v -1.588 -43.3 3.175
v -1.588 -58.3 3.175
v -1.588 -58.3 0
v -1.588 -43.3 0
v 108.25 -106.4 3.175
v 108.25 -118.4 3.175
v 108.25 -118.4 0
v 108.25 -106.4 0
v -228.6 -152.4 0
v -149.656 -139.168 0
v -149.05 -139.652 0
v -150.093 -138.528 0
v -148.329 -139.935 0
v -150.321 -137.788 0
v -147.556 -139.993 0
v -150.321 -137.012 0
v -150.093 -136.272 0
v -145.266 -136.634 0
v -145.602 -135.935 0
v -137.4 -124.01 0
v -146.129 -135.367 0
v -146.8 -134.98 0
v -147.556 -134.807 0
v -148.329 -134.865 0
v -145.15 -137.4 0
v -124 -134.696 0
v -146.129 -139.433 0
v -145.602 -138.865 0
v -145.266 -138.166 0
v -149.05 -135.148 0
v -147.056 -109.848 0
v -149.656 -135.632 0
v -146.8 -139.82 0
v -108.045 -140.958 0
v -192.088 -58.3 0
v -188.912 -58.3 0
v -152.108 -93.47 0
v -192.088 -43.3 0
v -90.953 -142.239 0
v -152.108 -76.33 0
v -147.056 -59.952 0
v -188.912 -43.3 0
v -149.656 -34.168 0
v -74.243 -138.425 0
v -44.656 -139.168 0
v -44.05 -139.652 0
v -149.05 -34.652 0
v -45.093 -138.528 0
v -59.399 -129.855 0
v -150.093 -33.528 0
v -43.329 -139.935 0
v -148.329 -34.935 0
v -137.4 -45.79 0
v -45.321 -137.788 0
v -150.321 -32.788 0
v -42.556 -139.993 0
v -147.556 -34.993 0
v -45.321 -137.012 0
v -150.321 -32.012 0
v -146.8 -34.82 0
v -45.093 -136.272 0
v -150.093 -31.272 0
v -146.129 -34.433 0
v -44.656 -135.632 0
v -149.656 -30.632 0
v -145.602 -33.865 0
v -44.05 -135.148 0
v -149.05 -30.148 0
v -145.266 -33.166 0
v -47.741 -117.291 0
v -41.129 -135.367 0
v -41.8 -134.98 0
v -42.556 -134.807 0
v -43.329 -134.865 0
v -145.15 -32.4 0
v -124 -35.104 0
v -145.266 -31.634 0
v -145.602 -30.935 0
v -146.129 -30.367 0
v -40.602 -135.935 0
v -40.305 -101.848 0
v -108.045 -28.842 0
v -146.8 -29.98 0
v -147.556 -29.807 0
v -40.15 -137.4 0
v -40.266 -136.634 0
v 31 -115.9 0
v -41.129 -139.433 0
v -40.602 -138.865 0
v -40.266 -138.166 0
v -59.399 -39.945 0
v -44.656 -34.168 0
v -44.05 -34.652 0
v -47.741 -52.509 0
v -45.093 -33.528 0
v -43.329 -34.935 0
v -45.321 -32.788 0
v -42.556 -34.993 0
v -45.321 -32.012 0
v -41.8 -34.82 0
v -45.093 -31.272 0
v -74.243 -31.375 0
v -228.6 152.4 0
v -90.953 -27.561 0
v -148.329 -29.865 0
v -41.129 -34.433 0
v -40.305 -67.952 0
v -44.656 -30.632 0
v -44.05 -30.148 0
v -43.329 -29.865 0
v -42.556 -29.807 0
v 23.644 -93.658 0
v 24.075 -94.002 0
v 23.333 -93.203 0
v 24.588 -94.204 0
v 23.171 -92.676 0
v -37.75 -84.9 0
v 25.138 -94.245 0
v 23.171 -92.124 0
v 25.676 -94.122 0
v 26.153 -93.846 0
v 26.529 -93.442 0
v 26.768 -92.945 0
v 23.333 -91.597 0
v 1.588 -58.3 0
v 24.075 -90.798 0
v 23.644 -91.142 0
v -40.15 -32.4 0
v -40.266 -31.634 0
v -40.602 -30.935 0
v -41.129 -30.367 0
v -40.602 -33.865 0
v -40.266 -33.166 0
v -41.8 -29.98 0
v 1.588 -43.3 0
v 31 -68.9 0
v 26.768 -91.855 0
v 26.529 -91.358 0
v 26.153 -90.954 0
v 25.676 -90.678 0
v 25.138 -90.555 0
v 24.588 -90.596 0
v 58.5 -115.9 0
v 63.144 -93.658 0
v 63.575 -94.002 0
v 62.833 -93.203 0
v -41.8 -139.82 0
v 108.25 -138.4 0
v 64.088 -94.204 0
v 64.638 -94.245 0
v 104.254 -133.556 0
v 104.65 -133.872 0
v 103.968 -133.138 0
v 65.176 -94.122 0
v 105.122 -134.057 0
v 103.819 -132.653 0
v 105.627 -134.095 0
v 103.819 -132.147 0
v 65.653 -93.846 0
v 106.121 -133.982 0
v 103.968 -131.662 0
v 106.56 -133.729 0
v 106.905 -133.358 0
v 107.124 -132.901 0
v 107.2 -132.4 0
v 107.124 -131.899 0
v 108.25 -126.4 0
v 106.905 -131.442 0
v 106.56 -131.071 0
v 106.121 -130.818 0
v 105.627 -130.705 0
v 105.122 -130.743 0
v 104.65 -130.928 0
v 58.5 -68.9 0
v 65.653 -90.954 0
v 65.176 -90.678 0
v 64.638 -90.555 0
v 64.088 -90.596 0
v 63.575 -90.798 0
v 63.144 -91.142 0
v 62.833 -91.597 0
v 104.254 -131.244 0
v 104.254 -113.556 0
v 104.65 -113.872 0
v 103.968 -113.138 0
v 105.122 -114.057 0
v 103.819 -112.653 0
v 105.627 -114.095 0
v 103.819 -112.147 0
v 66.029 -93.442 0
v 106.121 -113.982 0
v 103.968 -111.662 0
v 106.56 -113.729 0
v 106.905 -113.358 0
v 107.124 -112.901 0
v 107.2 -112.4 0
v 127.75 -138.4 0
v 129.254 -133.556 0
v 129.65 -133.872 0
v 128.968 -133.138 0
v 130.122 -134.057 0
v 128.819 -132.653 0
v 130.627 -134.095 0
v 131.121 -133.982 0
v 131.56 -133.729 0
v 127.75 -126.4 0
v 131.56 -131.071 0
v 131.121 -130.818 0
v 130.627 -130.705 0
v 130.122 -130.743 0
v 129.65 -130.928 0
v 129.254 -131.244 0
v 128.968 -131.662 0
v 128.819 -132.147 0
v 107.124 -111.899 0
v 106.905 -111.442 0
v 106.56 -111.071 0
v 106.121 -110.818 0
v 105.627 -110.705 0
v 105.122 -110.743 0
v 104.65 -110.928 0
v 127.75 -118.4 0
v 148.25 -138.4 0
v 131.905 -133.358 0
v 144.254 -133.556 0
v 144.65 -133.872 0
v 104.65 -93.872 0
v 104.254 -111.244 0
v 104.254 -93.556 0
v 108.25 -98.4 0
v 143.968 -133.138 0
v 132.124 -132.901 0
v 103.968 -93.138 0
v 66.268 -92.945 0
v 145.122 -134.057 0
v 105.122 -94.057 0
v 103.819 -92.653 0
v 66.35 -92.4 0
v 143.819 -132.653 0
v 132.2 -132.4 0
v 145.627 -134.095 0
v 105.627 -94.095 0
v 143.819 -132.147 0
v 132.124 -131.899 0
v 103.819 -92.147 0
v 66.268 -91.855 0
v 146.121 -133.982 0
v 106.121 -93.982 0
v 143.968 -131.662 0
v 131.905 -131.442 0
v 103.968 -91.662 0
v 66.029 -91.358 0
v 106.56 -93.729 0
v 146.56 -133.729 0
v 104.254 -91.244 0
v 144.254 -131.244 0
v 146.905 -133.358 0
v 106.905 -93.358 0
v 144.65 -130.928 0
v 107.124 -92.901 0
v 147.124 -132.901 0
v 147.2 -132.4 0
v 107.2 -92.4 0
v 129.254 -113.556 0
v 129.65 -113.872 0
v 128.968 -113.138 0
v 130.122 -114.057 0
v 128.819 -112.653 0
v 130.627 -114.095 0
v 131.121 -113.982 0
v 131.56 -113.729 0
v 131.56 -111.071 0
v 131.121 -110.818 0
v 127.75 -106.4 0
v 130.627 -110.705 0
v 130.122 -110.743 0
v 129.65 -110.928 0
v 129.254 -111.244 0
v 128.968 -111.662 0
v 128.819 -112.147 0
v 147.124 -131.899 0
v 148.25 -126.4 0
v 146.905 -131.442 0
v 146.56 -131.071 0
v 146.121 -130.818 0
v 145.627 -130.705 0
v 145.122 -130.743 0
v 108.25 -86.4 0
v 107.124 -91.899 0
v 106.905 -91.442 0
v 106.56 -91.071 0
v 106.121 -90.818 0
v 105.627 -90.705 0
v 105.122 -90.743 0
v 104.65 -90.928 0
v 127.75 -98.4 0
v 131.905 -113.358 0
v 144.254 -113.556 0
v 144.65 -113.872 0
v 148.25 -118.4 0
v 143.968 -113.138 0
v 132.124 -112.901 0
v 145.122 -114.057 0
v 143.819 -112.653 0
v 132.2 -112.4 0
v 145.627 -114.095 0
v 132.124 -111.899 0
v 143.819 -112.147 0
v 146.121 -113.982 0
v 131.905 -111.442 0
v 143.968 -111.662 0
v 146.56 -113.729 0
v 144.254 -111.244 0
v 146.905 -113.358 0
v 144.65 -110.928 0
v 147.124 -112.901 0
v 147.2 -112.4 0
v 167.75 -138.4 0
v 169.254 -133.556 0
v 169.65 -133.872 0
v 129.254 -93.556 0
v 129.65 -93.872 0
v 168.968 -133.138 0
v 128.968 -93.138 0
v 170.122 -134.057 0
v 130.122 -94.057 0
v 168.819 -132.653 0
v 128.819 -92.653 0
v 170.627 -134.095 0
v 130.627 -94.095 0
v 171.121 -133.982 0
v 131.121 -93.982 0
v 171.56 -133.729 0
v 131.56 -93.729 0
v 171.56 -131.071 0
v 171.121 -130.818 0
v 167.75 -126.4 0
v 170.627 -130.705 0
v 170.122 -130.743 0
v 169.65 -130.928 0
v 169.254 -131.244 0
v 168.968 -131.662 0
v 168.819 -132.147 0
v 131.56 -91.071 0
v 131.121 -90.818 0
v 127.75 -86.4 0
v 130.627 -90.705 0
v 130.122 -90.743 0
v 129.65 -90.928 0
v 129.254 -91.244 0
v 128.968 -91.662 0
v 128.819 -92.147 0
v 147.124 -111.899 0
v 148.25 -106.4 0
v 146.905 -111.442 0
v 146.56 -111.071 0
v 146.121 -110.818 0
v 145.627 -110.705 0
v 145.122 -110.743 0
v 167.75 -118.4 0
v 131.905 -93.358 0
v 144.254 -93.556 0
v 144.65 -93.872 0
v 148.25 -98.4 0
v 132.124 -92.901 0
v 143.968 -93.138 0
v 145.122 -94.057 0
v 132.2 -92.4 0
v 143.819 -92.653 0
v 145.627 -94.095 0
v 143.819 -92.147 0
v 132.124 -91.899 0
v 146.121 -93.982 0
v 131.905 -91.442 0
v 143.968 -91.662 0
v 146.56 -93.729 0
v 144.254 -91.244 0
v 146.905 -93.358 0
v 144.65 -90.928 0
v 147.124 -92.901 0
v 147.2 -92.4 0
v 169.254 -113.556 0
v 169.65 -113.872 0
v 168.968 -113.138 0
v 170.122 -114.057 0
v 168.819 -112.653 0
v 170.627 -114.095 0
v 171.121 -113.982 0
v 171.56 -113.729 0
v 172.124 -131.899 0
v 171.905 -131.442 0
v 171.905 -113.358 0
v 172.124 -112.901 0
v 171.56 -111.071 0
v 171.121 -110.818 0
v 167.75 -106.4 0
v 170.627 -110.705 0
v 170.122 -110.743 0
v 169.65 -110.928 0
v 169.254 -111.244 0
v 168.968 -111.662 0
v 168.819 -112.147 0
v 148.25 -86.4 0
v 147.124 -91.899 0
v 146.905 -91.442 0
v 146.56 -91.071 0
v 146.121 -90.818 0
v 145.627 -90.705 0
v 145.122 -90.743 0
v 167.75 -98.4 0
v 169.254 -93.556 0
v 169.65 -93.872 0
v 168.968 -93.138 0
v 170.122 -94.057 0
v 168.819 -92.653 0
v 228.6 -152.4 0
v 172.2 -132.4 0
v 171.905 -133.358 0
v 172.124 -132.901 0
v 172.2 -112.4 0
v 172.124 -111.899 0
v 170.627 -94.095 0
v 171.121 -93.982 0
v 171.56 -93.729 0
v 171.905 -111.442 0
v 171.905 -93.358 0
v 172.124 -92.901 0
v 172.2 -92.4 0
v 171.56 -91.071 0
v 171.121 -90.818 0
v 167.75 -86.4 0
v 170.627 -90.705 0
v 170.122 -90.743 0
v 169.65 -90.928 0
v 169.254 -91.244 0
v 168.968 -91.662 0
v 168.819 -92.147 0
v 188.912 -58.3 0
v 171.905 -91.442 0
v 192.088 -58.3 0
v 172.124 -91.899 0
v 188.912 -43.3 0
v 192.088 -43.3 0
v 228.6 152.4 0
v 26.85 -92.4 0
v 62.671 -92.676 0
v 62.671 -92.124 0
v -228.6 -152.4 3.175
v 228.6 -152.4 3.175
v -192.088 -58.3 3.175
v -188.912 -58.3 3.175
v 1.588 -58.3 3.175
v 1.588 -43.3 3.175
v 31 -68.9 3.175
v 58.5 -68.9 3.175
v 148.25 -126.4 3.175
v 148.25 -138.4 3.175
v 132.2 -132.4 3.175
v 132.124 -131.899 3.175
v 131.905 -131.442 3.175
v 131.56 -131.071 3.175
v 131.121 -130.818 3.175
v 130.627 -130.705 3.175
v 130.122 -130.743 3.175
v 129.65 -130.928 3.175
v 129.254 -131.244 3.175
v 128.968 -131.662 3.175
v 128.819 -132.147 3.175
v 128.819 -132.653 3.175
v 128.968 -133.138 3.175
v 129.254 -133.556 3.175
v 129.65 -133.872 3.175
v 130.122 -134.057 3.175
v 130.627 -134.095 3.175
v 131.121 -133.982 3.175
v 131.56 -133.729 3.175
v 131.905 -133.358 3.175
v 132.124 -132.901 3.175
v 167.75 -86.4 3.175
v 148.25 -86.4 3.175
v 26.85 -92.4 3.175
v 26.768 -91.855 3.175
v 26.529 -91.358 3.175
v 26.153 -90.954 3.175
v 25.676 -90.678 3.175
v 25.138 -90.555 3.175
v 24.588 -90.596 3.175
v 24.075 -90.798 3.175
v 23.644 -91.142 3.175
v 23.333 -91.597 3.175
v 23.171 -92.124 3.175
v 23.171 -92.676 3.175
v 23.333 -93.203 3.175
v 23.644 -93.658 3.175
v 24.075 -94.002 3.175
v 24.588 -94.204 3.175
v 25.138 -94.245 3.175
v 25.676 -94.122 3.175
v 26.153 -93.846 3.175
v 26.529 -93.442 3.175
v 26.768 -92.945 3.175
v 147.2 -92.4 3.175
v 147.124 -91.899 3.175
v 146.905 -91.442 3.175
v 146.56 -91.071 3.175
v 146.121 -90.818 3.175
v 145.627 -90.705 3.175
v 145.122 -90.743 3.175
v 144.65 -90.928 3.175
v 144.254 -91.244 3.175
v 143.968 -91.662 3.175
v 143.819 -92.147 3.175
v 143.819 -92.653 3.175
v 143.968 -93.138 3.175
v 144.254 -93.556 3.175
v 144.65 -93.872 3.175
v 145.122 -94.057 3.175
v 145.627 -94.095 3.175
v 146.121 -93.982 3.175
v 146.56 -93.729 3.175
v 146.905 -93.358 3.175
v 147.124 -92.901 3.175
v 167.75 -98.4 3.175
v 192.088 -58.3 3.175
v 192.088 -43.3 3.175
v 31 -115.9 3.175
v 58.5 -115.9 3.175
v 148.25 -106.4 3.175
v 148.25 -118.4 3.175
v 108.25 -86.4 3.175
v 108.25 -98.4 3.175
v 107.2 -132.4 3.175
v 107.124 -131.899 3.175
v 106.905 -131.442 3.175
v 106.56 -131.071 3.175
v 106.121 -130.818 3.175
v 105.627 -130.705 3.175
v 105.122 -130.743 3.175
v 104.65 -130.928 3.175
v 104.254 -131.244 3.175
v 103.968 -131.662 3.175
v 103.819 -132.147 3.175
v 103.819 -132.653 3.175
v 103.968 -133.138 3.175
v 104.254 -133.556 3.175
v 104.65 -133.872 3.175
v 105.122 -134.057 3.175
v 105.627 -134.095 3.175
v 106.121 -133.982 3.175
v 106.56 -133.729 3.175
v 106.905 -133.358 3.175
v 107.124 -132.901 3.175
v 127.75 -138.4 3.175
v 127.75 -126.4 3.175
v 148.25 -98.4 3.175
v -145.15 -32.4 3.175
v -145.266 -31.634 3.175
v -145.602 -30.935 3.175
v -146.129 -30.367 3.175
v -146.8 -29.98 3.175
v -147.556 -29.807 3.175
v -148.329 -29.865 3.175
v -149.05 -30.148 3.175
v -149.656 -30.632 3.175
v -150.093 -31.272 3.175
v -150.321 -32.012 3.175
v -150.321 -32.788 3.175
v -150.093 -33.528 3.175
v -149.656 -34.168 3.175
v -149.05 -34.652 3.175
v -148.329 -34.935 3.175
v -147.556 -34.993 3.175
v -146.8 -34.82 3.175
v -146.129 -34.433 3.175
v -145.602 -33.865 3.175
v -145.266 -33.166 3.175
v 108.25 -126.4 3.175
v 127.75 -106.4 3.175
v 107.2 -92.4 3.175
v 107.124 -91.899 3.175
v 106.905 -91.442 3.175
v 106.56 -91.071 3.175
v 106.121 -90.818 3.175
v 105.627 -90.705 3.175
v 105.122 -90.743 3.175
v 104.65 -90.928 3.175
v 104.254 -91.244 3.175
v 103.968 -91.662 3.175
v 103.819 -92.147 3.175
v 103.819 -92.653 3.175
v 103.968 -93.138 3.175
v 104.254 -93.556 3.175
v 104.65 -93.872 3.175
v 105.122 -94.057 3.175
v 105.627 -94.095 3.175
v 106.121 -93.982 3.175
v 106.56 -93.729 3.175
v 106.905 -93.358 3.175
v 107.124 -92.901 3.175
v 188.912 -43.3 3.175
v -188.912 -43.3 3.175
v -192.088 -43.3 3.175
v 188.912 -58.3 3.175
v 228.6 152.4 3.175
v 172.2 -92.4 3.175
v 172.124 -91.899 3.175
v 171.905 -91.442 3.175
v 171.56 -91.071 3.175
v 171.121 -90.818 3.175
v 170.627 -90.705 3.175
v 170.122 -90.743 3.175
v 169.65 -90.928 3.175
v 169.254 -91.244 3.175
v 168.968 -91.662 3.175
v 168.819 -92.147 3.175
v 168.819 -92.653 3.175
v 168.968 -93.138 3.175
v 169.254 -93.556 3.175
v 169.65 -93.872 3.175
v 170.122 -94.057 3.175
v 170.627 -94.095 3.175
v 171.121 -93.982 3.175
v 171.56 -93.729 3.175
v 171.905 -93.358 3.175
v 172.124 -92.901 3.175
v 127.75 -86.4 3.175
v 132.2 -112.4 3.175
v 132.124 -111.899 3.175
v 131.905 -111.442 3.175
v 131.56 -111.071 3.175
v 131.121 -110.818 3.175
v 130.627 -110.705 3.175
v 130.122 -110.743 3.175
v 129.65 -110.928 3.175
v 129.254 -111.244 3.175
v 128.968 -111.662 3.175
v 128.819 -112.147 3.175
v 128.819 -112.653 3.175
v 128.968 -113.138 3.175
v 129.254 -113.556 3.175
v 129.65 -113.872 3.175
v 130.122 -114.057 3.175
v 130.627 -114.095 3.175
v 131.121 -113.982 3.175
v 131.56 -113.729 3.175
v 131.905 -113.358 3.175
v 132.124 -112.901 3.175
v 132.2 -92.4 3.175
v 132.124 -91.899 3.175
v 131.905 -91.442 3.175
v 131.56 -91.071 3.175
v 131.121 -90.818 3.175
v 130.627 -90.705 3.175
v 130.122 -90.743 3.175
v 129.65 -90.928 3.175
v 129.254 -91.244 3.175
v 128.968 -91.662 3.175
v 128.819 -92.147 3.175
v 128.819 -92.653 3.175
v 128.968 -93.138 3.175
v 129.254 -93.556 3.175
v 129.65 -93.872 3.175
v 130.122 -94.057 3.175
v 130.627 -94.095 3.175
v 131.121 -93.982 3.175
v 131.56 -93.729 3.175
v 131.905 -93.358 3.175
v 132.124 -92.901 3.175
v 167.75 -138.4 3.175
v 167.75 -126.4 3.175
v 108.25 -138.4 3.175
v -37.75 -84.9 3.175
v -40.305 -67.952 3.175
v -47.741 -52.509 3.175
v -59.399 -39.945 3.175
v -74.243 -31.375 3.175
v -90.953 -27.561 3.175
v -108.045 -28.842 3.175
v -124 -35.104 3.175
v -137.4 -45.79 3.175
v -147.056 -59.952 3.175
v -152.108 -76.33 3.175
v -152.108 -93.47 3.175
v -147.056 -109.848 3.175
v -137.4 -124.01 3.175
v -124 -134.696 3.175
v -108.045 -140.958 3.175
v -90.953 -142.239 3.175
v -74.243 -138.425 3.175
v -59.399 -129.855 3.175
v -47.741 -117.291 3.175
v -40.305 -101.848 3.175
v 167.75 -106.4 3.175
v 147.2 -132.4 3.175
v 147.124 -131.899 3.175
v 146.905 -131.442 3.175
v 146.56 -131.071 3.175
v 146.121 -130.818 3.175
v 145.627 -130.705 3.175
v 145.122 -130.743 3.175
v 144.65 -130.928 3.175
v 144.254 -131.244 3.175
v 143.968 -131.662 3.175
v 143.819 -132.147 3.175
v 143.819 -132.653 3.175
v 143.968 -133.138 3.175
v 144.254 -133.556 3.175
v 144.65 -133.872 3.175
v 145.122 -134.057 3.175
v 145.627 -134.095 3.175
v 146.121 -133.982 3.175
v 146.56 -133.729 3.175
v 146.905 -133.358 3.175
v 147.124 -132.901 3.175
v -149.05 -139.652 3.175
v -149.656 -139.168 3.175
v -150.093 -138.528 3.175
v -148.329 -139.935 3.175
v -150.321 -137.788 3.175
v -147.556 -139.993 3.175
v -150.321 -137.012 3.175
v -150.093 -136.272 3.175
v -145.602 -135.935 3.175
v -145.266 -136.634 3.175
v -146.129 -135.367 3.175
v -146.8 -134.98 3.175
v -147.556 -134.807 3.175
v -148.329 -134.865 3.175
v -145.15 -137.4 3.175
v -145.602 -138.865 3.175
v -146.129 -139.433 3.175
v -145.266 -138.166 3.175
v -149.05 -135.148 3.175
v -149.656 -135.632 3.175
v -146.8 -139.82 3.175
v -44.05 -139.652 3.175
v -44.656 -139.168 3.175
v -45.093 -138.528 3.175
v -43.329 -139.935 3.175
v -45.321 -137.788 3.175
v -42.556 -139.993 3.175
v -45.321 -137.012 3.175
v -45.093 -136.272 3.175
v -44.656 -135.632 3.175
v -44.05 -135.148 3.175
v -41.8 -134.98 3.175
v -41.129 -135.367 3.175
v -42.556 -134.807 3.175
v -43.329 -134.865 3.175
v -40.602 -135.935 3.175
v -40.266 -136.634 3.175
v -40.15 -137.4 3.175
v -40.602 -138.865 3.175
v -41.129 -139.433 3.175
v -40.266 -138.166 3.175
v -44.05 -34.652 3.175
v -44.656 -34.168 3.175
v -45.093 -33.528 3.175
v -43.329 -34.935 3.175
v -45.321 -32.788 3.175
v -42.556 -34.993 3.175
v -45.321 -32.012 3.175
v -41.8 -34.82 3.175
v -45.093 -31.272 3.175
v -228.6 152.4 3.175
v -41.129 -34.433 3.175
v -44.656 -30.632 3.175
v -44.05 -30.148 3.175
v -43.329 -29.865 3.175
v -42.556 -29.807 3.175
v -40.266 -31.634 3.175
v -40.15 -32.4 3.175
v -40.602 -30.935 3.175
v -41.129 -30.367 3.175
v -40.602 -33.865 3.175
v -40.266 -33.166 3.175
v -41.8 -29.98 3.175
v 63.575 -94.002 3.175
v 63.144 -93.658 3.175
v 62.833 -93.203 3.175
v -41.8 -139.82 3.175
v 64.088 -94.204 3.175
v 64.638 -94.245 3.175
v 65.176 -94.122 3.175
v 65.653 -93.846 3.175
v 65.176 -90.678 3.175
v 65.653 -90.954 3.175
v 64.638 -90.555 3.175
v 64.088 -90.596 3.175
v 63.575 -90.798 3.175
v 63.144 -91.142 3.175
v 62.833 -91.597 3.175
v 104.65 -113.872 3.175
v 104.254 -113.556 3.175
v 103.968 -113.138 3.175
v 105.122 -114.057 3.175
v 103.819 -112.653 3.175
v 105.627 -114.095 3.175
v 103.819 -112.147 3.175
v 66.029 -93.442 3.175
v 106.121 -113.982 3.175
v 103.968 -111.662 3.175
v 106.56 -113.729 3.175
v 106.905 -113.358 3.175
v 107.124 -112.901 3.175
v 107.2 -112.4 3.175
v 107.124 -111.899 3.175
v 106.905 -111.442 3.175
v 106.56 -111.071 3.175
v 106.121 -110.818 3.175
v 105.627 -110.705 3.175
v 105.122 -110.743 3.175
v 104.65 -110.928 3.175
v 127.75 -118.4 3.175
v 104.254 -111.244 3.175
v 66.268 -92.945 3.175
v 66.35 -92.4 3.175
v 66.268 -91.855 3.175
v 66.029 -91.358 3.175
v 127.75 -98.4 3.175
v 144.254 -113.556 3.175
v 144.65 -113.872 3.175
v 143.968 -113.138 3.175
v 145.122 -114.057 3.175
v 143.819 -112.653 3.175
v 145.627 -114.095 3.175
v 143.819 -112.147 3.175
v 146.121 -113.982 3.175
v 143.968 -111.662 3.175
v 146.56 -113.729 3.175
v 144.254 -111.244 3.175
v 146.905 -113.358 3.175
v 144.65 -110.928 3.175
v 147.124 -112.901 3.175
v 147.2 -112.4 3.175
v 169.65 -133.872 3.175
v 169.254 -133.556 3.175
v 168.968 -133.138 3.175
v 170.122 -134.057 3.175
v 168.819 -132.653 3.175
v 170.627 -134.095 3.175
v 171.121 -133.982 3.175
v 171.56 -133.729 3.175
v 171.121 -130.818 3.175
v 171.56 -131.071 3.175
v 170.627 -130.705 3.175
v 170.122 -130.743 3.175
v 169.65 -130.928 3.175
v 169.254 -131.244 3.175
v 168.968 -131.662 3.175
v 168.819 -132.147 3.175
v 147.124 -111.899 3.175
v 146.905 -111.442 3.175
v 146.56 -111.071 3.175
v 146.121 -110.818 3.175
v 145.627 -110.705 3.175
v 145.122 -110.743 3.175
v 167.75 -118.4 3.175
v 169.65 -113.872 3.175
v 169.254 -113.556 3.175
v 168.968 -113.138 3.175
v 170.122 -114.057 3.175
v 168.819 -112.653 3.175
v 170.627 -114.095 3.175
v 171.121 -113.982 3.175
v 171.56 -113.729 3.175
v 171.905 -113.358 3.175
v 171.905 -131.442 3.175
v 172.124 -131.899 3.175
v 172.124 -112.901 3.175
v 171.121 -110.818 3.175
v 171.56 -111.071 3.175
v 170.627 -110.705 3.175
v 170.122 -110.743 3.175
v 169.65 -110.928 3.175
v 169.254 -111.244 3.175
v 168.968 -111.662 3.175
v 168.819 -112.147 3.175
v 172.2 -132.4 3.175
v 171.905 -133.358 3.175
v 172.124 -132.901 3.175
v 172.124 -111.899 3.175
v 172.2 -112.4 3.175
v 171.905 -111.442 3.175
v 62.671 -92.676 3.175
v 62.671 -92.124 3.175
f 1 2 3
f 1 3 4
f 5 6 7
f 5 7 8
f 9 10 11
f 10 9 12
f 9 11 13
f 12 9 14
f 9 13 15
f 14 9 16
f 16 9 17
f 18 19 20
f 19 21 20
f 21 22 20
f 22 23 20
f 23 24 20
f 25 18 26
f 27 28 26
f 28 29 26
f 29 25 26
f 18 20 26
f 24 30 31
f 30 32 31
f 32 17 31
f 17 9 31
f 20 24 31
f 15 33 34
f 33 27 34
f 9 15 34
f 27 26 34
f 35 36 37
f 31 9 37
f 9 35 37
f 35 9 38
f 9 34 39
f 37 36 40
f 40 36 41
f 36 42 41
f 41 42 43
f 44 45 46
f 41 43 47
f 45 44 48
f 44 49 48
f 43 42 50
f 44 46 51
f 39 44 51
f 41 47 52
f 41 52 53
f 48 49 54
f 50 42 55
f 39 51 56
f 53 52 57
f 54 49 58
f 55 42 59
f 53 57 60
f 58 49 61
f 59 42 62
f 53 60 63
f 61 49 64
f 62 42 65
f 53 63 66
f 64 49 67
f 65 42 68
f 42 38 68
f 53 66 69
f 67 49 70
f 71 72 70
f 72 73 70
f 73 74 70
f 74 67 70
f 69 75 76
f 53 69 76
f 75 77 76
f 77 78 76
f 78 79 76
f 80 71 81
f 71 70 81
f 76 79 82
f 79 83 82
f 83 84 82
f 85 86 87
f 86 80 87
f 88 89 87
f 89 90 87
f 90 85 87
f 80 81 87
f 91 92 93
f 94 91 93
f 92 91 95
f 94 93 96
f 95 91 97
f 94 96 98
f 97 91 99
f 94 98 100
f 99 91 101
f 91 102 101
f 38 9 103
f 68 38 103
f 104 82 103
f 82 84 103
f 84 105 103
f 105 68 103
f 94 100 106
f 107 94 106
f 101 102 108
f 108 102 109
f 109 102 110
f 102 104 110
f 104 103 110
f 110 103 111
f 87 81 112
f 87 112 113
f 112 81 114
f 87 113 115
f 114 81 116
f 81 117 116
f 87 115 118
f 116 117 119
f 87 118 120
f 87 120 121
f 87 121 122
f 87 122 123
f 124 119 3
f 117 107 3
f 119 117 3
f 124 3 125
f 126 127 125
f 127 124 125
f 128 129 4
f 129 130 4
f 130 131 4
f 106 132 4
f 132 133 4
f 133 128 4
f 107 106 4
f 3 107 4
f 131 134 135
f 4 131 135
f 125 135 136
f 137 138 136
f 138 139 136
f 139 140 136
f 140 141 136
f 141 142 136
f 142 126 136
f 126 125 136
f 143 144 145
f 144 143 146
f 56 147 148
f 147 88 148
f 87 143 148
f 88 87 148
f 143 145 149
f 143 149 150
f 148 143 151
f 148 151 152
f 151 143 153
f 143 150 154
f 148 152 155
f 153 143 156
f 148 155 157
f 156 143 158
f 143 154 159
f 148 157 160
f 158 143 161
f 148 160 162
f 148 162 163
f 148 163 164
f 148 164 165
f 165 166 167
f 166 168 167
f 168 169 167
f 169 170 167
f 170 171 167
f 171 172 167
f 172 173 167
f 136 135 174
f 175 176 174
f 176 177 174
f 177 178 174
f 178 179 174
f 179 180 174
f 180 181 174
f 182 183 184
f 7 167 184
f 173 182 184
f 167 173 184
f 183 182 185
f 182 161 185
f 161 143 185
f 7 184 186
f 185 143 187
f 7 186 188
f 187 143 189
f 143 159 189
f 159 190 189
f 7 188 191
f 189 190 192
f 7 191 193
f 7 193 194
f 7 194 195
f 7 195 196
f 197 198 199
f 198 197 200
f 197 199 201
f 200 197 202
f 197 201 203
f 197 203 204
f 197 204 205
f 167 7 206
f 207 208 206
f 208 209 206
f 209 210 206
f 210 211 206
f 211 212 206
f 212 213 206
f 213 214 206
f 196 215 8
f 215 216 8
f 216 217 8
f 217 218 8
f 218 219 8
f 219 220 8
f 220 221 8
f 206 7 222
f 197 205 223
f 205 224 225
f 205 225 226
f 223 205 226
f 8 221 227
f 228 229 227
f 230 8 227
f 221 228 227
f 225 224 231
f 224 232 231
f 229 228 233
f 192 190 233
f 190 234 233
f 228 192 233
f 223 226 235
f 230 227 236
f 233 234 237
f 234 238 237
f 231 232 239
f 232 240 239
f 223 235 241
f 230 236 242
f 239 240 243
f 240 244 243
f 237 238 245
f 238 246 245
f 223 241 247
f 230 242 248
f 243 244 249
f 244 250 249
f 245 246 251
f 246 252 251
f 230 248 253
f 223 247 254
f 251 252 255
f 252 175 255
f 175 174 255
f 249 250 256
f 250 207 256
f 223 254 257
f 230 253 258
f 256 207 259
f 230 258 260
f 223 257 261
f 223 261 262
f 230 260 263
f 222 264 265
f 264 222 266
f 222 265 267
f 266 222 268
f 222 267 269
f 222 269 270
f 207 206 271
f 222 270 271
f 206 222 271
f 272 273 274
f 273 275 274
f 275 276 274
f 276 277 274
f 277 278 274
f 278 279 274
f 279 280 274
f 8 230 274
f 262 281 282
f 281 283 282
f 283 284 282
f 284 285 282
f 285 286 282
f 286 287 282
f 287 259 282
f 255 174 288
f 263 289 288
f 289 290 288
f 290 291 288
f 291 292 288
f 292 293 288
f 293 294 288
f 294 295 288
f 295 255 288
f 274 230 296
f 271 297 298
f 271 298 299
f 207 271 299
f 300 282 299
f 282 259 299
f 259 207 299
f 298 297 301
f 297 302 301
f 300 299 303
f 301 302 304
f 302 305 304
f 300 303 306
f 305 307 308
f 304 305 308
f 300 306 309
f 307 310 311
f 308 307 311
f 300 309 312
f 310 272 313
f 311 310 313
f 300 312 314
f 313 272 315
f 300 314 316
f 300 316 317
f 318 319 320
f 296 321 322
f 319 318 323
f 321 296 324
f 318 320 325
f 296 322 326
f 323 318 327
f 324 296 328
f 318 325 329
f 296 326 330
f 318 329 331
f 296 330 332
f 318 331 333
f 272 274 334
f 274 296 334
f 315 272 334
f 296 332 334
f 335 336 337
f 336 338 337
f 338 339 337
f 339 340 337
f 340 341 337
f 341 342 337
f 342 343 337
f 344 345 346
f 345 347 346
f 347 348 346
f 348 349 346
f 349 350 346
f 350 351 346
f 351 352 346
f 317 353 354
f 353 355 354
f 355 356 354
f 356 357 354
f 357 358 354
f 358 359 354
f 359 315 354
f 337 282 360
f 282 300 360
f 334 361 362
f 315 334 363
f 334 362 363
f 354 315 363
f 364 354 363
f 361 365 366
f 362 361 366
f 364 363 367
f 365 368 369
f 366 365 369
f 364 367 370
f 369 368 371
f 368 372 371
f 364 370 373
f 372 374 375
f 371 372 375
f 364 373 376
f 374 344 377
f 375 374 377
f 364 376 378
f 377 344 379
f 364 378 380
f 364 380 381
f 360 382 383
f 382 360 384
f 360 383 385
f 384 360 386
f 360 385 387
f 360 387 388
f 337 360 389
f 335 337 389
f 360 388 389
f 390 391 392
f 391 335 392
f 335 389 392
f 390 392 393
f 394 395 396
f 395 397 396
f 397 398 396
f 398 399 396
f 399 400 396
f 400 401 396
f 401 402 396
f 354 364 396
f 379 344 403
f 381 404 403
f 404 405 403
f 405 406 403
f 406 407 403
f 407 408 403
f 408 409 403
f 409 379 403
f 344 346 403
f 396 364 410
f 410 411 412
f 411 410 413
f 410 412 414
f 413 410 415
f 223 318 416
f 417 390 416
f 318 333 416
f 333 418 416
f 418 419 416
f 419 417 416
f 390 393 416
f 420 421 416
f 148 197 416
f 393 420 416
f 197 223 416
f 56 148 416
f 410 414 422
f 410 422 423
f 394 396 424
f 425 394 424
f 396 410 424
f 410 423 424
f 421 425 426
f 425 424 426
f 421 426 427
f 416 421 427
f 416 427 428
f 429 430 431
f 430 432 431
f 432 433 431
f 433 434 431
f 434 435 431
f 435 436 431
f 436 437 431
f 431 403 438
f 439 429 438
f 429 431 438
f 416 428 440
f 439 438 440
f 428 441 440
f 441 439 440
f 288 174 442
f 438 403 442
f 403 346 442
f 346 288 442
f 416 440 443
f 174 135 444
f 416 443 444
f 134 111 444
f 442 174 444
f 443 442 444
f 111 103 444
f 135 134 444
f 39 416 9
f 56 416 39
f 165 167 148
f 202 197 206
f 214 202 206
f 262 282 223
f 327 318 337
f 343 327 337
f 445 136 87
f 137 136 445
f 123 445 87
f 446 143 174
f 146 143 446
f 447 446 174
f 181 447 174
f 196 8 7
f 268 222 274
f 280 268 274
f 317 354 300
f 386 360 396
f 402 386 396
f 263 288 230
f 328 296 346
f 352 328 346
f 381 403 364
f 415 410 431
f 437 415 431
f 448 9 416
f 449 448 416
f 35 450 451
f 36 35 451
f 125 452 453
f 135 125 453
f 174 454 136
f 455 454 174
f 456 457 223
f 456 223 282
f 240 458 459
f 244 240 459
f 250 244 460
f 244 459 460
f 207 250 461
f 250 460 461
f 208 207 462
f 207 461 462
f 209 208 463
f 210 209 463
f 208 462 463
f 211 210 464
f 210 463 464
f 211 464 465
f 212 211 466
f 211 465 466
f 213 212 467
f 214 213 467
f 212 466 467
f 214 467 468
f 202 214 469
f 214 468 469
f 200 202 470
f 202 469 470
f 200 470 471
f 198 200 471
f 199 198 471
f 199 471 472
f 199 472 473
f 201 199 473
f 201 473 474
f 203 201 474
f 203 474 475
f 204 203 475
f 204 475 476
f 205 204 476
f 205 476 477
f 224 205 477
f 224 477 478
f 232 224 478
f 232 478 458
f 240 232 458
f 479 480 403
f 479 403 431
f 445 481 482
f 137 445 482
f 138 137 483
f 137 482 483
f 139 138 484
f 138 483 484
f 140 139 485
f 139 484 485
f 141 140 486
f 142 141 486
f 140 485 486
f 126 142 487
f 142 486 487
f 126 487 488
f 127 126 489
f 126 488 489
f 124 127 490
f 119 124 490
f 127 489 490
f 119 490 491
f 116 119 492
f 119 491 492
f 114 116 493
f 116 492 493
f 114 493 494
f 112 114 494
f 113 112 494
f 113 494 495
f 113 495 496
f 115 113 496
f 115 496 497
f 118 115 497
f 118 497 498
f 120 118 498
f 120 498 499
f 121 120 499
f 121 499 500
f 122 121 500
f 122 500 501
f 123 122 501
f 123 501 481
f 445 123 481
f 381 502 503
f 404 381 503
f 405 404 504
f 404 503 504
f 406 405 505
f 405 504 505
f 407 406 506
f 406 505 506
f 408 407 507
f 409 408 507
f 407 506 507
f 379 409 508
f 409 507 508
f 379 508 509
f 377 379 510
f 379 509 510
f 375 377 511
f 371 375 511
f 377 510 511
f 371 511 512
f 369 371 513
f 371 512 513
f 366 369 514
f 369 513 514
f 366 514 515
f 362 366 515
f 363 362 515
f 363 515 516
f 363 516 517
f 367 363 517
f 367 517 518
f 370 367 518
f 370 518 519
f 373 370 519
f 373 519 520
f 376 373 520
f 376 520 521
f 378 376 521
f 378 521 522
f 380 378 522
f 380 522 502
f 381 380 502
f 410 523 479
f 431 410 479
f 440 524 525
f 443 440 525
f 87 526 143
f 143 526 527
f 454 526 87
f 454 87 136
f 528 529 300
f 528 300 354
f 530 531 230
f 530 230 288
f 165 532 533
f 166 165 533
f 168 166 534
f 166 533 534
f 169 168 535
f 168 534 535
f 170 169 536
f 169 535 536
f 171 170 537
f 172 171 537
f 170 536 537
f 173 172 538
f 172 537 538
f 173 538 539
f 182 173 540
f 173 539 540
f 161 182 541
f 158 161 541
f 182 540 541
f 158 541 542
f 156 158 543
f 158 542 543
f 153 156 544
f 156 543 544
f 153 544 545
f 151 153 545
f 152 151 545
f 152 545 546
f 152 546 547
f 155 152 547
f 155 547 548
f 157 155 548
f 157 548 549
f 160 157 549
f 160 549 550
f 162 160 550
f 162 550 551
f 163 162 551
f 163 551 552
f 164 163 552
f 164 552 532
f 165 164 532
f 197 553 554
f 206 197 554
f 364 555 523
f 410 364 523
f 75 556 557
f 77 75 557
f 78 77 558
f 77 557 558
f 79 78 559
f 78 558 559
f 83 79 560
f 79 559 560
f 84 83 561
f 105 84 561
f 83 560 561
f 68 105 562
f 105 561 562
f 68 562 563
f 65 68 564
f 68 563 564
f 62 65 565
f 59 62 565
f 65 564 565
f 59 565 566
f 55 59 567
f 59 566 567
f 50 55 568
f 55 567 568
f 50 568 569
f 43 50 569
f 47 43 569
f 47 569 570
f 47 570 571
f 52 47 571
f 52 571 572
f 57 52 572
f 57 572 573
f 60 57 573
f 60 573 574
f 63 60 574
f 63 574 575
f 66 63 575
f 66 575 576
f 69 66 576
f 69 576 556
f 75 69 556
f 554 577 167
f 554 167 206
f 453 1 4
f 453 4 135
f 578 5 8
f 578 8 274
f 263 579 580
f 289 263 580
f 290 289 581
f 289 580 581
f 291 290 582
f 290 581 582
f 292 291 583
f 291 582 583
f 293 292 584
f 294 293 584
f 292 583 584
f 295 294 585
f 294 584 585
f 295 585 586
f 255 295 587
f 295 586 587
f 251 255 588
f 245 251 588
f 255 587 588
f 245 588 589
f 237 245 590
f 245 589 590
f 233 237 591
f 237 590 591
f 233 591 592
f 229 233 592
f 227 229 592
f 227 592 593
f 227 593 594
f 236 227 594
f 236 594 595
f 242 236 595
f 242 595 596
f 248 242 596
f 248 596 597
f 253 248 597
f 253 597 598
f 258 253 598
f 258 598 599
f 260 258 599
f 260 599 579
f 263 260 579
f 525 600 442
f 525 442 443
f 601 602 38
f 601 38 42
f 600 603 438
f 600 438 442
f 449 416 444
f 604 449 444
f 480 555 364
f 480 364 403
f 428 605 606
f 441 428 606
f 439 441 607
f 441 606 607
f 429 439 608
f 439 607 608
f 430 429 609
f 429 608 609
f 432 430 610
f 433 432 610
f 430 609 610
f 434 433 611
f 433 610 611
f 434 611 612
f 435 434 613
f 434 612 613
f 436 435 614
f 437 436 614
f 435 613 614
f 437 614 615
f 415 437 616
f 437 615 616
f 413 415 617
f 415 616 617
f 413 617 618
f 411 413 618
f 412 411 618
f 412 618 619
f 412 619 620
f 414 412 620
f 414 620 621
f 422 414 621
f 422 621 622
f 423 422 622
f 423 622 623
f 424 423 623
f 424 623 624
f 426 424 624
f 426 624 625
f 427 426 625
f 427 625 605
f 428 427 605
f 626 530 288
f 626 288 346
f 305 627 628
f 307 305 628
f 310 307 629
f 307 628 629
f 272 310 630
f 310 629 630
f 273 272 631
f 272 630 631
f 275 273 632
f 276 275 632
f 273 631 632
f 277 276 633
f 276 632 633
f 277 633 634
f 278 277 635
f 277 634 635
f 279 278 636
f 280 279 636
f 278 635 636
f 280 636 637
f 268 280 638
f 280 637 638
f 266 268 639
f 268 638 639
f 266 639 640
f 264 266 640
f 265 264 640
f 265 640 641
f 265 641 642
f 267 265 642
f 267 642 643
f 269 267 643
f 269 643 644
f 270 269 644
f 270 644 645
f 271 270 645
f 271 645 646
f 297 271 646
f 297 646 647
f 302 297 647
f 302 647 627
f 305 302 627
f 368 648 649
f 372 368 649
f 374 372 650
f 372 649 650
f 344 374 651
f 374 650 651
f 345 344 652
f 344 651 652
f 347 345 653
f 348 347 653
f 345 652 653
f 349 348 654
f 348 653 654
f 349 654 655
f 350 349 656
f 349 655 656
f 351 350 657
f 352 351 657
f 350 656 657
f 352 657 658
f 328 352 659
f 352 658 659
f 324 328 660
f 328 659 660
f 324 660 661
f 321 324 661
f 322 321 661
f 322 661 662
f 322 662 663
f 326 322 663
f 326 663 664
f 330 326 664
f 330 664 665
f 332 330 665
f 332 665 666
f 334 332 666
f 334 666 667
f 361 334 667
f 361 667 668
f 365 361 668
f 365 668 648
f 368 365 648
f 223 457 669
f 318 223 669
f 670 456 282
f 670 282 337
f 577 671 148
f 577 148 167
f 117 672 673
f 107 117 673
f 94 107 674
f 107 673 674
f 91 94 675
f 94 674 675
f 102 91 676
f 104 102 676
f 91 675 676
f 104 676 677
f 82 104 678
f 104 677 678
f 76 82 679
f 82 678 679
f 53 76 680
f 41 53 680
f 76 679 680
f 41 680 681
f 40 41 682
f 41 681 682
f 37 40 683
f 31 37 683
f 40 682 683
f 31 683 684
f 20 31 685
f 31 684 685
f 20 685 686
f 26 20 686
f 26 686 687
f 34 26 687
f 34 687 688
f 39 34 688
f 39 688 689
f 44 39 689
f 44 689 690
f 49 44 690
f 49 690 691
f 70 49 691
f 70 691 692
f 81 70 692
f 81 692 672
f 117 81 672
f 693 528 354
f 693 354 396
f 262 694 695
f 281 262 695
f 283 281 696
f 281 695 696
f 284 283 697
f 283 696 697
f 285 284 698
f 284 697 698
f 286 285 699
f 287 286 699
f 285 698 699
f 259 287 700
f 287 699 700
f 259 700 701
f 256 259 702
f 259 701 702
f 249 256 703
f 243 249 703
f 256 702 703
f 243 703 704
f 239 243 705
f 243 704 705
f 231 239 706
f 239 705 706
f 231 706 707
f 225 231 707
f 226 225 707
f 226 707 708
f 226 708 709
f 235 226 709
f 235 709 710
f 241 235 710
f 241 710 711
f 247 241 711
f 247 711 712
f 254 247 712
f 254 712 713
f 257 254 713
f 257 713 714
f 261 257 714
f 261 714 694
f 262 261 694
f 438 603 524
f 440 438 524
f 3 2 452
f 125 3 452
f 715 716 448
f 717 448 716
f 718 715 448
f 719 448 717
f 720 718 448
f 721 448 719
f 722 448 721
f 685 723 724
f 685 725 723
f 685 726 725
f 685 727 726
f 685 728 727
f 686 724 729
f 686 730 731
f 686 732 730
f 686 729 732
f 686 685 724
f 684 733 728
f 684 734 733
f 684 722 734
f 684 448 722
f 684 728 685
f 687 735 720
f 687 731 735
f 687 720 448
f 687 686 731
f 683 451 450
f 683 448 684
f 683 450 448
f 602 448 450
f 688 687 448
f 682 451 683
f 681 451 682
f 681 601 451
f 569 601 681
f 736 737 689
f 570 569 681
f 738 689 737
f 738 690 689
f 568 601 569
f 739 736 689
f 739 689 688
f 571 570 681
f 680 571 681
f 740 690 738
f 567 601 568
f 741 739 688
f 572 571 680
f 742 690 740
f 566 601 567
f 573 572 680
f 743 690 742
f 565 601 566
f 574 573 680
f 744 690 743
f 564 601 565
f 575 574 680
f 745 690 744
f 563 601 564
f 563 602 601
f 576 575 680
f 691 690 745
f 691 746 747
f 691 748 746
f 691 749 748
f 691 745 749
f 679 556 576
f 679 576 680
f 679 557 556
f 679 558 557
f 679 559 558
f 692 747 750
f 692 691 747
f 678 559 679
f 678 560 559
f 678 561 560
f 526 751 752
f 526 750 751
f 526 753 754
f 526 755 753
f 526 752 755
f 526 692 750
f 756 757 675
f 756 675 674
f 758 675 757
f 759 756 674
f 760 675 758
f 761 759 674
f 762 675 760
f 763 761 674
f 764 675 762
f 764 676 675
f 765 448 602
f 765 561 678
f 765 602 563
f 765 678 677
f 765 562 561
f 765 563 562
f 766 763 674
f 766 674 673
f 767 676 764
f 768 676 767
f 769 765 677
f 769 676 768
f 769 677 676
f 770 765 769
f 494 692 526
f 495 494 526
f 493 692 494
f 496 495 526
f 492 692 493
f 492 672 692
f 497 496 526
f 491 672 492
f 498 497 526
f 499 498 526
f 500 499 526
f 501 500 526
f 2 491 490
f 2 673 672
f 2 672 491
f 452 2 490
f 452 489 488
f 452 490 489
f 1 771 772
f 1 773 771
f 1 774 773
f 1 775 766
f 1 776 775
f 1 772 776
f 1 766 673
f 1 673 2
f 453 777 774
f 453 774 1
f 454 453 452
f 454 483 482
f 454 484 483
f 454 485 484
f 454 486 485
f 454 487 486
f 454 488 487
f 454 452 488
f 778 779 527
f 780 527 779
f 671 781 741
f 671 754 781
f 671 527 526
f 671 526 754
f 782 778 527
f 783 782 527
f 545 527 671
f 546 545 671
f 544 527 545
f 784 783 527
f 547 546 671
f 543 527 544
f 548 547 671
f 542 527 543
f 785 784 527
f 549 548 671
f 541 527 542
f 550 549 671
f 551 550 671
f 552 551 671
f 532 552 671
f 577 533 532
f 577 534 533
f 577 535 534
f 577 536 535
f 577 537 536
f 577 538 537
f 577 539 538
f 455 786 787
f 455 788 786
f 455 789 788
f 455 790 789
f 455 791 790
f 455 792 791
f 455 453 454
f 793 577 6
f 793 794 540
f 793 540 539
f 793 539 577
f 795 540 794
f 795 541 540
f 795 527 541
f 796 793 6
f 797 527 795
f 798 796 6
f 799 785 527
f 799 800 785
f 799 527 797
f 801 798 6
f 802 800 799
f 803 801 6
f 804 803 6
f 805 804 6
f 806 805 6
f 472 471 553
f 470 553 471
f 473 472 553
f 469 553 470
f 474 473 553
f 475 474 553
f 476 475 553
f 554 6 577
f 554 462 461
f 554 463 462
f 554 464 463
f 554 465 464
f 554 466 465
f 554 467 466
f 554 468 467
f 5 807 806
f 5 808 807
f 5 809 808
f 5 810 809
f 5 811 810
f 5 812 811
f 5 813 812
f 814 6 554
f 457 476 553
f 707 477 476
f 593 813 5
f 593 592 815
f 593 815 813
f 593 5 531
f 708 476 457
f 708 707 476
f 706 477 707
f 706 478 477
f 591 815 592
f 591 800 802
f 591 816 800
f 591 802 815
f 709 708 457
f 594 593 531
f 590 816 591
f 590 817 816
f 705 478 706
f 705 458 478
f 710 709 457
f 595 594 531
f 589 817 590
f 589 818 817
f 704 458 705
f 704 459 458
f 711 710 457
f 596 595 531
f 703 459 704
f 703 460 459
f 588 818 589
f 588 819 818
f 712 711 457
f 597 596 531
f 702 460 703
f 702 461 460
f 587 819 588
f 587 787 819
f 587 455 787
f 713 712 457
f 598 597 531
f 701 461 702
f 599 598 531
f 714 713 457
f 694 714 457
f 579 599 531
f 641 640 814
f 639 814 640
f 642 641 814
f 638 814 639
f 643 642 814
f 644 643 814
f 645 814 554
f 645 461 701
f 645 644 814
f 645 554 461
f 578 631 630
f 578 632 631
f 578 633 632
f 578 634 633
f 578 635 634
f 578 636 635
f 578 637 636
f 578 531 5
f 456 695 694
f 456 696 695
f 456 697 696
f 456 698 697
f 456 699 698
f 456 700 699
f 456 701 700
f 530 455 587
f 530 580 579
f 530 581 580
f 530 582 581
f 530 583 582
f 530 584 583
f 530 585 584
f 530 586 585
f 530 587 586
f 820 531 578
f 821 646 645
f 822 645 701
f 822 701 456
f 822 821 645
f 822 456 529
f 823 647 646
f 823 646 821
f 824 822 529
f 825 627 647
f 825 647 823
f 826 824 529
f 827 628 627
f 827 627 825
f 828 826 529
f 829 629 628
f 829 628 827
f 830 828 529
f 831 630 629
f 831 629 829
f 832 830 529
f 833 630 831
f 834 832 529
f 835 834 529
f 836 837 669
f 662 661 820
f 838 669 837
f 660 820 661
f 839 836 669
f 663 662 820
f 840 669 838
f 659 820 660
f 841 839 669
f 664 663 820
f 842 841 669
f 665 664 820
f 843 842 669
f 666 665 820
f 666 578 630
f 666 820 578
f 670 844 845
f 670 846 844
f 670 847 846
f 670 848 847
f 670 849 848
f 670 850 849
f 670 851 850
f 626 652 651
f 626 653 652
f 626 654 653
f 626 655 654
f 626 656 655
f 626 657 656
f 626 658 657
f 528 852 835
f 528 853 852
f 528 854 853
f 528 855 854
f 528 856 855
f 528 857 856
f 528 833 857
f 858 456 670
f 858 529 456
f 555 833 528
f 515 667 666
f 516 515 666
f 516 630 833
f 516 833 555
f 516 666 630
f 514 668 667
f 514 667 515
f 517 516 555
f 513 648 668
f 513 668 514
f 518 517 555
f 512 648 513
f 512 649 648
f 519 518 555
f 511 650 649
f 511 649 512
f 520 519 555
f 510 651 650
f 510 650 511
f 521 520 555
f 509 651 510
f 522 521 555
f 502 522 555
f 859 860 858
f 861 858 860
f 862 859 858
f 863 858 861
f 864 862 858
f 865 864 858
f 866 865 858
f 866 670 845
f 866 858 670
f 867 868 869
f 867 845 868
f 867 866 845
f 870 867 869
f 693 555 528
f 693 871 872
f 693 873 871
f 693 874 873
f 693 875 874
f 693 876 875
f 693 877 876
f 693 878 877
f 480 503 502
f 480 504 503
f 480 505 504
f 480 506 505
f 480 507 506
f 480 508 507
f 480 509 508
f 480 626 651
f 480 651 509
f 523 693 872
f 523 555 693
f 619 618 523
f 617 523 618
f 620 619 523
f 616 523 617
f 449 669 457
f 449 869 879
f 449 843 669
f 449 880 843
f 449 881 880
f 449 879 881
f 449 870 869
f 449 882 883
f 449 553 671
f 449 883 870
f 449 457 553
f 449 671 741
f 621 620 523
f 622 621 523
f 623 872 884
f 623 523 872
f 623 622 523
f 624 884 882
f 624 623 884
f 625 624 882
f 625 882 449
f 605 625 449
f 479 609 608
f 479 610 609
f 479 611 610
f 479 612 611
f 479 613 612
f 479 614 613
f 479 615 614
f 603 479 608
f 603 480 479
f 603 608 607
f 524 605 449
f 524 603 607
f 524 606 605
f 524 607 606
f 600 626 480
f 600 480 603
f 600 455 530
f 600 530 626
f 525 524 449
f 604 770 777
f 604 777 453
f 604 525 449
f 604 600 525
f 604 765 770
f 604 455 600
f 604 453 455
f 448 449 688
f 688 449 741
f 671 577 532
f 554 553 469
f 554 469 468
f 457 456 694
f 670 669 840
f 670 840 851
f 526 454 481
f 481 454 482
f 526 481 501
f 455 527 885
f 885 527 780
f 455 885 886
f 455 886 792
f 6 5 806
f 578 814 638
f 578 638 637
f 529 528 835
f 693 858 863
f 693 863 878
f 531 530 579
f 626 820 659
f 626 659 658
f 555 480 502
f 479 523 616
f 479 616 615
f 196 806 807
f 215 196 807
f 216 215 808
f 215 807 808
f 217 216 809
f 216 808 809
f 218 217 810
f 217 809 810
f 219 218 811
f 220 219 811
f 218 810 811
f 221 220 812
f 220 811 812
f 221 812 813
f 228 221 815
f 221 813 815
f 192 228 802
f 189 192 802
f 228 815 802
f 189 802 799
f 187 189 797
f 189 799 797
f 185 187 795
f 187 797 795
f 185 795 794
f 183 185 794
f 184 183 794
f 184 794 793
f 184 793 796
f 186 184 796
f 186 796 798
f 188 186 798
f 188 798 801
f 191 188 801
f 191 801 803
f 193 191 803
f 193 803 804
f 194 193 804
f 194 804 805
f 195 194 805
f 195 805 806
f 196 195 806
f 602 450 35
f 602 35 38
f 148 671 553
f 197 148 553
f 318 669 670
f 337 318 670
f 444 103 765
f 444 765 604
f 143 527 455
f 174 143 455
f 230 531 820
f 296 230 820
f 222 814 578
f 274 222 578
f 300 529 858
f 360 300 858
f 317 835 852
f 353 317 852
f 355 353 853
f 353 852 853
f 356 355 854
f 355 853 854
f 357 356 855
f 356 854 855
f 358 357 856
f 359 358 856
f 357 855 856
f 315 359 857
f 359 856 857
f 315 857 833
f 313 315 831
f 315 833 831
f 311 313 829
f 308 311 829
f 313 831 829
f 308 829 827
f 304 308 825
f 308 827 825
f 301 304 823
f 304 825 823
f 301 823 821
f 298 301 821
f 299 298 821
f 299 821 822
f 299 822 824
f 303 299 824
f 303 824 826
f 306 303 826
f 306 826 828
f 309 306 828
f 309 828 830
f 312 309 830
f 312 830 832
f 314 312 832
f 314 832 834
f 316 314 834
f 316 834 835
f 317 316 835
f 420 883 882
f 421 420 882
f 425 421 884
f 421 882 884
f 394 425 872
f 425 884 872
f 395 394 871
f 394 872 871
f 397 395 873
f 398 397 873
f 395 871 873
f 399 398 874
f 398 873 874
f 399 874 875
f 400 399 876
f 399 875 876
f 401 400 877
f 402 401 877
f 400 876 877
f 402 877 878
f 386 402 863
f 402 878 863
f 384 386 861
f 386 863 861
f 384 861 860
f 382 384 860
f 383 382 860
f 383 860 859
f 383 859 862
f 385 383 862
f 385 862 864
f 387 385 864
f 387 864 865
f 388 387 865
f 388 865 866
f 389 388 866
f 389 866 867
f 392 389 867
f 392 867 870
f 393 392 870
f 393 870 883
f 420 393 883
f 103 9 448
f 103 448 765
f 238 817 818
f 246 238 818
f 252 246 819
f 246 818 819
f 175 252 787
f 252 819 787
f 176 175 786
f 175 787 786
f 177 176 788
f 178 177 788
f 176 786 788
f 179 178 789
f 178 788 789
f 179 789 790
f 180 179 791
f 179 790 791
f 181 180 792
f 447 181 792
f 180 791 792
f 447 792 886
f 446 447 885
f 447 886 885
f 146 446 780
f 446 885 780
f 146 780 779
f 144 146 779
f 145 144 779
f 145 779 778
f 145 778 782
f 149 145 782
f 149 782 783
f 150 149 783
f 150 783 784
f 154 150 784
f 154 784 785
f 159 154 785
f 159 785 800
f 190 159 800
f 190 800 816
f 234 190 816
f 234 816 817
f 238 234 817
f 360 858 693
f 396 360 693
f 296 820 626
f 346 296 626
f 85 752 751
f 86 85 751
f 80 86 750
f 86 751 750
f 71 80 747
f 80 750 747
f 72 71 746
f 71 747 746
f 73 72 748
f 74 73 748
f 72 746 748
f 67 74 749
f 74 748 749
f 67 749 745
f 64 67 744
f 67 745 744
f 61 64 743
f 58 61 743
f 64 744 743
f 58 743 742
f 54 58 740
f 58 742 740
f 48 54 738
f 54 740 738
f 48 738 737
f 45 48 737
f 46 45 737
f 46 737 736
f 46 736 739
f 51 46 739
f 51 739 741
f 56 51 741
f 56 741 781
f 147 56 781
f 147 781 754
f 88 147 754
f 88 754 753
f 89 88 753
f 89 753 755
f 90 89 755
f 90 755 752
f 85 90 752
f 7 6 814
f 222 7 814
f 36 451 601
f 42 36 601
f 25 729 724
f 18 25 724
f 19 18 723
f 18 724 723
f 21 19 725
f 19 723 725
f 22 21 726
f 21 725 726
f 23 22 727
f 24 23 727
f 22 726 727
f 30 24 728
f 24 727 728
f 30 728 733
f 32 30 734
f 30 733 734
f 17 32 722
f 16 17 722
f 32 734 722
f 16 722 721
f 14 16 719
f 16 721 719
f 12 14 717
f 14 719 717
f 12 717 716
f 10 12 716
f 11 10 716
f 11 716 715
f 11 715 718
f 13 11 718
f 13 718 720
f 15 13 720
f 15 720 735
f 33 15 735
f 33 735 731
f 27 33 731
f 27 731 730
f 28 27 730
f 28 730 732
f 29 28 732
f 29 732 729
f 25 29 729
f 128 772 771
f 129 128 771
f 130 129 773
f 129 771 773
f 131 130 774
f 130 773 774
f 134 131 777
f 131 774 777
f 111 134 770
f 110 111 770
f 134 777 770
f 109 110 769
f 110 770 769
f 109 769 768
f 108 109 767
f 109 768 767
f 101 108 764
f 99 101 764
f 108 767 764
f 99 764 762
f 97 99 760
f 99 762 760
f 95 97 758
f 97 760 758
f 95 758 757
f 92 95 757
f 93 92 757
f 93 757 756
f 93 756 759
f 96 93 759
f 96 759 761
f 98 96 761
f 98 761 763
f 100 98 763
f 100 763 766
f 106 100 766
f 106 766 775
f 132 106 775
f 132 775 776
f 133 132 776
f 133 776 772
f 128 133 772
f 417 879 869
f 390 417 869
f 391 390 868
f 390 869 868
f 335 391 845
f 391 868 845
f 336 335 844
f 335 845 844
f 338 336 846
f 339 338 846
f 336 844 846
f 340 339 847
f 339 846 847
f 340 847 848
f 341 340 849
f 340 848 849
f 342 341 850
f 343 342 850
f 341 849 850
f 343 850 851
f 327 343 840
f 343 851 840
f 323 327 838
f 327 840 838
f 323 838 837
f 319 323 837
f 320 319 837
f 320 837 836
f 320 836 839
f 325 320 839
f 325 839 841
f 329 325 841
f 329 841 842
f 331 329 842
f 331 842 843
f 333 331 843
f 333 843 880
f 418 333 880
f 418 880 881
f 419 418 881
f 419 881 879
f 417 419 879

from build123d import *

# Parameters (mm, degrees)
SKETCH1_W           = 457.2
SKETCH1_H           = 304.8
ACRYLIC_PANEL_DEPTH = 3.175
SKETCH2_R           = 2.6
SKETCH2_R_2         = 57.5
SKETCH2_R_3         = 1.85
SKETCH2_R_4         = 1.7
SKETCH2_W           = 3.175
SKETCH2_H           = 15
SKETCH2_W_2         = 19.5
SKETCH2_H_2         = 12
SKETCH2_W_3         = 27.5
SKETCH2_H_3         = 47
CUT_EXTRUDE1_DEPTH  = 275.761352131


with BuildPart() as part:
    # Sketch1 → Acrylic Panel (new body)
    with BuildSketch(Plane.XY):
        Rectangle(SKETCH1_W, SKETCH1_H)
    extrude(amount=ACRYLIC_PANEL_DEPTH)

    # Sketch2 → Cut-Extrude1 (cut, through all)
    with BuildSketch(Plane.XY.offset(3.175)):
        with Locations((-147.75, -32.4)):
            Circle(SKETCH2_R)
        with Locations((-42.75, -32.4)):
            Circle(SKETCH2_R)
        with Locations((-147.75, -137.4)):
            Circle(SKETCH2_R)
        with Locations((-42.75, -137.4)):
            Circle(SKETCH2_R)
        with Locations((-95.25, -84.9)):
            Circle(SKETCH2_R_2)
        with Locations((25, -92.4)):
            Circle(SKETCH2_R_3)
        with Locations((64.5, -92.4)):
            Circle(SKETCH2_R_3)
        with Locations((105.5, -132.4)):
            Circle(SKETCH2_R_4)
        with Locations((130.5, -132.4)):
            Circle(SKETCH2_R_4)
        with Locations((145.5, -132.4)):
            Circle(SKETCH2_R_4)
        with Locations((170.5, -132.4)):
            Circle(SKETCH2_R_4)
        with Locations((145.5, -112.4)):
            Circle(SKETCH2_R_4)
        with Locations((170.5, -112.4)):
            Circle(SKETCH2_R_4)
        with Locations((145.5, -92.4)):
            Circle(SKETCH2_R_4)
        with Locations((170.5, -92.4)):
            Circle(SKETCH2_R_4)
        with Locations((105.5, -112.4)):
            Circle(SKETCH2_R_4)
        with Locations((130.5, -112.4)):
            Circle(SKETCH2_R_4)
        with Locations((105.5, -92.4)):
            Circle(SKETCH2_R_4)
        with Locations((130.5, -92.4)):
            Circle(SKETCH2_R_4)
        with Locations((0, -50.8)):
            Rectangle(SKETCH2_W, SKETCH2_H)
        with Locations((190.5, -50.8)):
            Rectangle(SKETCH2_W, SKETCH2_H)
        with Locations((-190.5, -50.8)):
            Rectangle(SKETCH2_W, SKETCH2_H)
        with Locations((118, -132.4)):
            Rectangle(SKETCH2_W_2, SKETCH2_H_2)
        with Locations((158, -132.4)):
            Rectangle(SKETCH2_W_2, SKETCH2_H_2)
        with Locations((158, -112.4)):
            Rectangle(SKETCH2_W_2, SKETCH2_H_2)
        with Locations((158, -92.4)):
            Rectangle(SKETCH2_W_2, SKETCH2_H_2)
        with Locations((118, -112.4)):
            Rectangle(SKETCH2_W_2, SKETCH2_H_2)
        with Locations((118, -92.4)):
            Rectangle(SKETCH2_W_2, SKETCH2_H_2)
        with Locations((44.75, -92.4)):
            Rectangle(SKETCH2_W_3, SKETCH2_H_3)
    extrude(amount=-CUT_EXTRUDE1_DEPTH, mode=Mode.SUBTRACT)


solid = part.part
